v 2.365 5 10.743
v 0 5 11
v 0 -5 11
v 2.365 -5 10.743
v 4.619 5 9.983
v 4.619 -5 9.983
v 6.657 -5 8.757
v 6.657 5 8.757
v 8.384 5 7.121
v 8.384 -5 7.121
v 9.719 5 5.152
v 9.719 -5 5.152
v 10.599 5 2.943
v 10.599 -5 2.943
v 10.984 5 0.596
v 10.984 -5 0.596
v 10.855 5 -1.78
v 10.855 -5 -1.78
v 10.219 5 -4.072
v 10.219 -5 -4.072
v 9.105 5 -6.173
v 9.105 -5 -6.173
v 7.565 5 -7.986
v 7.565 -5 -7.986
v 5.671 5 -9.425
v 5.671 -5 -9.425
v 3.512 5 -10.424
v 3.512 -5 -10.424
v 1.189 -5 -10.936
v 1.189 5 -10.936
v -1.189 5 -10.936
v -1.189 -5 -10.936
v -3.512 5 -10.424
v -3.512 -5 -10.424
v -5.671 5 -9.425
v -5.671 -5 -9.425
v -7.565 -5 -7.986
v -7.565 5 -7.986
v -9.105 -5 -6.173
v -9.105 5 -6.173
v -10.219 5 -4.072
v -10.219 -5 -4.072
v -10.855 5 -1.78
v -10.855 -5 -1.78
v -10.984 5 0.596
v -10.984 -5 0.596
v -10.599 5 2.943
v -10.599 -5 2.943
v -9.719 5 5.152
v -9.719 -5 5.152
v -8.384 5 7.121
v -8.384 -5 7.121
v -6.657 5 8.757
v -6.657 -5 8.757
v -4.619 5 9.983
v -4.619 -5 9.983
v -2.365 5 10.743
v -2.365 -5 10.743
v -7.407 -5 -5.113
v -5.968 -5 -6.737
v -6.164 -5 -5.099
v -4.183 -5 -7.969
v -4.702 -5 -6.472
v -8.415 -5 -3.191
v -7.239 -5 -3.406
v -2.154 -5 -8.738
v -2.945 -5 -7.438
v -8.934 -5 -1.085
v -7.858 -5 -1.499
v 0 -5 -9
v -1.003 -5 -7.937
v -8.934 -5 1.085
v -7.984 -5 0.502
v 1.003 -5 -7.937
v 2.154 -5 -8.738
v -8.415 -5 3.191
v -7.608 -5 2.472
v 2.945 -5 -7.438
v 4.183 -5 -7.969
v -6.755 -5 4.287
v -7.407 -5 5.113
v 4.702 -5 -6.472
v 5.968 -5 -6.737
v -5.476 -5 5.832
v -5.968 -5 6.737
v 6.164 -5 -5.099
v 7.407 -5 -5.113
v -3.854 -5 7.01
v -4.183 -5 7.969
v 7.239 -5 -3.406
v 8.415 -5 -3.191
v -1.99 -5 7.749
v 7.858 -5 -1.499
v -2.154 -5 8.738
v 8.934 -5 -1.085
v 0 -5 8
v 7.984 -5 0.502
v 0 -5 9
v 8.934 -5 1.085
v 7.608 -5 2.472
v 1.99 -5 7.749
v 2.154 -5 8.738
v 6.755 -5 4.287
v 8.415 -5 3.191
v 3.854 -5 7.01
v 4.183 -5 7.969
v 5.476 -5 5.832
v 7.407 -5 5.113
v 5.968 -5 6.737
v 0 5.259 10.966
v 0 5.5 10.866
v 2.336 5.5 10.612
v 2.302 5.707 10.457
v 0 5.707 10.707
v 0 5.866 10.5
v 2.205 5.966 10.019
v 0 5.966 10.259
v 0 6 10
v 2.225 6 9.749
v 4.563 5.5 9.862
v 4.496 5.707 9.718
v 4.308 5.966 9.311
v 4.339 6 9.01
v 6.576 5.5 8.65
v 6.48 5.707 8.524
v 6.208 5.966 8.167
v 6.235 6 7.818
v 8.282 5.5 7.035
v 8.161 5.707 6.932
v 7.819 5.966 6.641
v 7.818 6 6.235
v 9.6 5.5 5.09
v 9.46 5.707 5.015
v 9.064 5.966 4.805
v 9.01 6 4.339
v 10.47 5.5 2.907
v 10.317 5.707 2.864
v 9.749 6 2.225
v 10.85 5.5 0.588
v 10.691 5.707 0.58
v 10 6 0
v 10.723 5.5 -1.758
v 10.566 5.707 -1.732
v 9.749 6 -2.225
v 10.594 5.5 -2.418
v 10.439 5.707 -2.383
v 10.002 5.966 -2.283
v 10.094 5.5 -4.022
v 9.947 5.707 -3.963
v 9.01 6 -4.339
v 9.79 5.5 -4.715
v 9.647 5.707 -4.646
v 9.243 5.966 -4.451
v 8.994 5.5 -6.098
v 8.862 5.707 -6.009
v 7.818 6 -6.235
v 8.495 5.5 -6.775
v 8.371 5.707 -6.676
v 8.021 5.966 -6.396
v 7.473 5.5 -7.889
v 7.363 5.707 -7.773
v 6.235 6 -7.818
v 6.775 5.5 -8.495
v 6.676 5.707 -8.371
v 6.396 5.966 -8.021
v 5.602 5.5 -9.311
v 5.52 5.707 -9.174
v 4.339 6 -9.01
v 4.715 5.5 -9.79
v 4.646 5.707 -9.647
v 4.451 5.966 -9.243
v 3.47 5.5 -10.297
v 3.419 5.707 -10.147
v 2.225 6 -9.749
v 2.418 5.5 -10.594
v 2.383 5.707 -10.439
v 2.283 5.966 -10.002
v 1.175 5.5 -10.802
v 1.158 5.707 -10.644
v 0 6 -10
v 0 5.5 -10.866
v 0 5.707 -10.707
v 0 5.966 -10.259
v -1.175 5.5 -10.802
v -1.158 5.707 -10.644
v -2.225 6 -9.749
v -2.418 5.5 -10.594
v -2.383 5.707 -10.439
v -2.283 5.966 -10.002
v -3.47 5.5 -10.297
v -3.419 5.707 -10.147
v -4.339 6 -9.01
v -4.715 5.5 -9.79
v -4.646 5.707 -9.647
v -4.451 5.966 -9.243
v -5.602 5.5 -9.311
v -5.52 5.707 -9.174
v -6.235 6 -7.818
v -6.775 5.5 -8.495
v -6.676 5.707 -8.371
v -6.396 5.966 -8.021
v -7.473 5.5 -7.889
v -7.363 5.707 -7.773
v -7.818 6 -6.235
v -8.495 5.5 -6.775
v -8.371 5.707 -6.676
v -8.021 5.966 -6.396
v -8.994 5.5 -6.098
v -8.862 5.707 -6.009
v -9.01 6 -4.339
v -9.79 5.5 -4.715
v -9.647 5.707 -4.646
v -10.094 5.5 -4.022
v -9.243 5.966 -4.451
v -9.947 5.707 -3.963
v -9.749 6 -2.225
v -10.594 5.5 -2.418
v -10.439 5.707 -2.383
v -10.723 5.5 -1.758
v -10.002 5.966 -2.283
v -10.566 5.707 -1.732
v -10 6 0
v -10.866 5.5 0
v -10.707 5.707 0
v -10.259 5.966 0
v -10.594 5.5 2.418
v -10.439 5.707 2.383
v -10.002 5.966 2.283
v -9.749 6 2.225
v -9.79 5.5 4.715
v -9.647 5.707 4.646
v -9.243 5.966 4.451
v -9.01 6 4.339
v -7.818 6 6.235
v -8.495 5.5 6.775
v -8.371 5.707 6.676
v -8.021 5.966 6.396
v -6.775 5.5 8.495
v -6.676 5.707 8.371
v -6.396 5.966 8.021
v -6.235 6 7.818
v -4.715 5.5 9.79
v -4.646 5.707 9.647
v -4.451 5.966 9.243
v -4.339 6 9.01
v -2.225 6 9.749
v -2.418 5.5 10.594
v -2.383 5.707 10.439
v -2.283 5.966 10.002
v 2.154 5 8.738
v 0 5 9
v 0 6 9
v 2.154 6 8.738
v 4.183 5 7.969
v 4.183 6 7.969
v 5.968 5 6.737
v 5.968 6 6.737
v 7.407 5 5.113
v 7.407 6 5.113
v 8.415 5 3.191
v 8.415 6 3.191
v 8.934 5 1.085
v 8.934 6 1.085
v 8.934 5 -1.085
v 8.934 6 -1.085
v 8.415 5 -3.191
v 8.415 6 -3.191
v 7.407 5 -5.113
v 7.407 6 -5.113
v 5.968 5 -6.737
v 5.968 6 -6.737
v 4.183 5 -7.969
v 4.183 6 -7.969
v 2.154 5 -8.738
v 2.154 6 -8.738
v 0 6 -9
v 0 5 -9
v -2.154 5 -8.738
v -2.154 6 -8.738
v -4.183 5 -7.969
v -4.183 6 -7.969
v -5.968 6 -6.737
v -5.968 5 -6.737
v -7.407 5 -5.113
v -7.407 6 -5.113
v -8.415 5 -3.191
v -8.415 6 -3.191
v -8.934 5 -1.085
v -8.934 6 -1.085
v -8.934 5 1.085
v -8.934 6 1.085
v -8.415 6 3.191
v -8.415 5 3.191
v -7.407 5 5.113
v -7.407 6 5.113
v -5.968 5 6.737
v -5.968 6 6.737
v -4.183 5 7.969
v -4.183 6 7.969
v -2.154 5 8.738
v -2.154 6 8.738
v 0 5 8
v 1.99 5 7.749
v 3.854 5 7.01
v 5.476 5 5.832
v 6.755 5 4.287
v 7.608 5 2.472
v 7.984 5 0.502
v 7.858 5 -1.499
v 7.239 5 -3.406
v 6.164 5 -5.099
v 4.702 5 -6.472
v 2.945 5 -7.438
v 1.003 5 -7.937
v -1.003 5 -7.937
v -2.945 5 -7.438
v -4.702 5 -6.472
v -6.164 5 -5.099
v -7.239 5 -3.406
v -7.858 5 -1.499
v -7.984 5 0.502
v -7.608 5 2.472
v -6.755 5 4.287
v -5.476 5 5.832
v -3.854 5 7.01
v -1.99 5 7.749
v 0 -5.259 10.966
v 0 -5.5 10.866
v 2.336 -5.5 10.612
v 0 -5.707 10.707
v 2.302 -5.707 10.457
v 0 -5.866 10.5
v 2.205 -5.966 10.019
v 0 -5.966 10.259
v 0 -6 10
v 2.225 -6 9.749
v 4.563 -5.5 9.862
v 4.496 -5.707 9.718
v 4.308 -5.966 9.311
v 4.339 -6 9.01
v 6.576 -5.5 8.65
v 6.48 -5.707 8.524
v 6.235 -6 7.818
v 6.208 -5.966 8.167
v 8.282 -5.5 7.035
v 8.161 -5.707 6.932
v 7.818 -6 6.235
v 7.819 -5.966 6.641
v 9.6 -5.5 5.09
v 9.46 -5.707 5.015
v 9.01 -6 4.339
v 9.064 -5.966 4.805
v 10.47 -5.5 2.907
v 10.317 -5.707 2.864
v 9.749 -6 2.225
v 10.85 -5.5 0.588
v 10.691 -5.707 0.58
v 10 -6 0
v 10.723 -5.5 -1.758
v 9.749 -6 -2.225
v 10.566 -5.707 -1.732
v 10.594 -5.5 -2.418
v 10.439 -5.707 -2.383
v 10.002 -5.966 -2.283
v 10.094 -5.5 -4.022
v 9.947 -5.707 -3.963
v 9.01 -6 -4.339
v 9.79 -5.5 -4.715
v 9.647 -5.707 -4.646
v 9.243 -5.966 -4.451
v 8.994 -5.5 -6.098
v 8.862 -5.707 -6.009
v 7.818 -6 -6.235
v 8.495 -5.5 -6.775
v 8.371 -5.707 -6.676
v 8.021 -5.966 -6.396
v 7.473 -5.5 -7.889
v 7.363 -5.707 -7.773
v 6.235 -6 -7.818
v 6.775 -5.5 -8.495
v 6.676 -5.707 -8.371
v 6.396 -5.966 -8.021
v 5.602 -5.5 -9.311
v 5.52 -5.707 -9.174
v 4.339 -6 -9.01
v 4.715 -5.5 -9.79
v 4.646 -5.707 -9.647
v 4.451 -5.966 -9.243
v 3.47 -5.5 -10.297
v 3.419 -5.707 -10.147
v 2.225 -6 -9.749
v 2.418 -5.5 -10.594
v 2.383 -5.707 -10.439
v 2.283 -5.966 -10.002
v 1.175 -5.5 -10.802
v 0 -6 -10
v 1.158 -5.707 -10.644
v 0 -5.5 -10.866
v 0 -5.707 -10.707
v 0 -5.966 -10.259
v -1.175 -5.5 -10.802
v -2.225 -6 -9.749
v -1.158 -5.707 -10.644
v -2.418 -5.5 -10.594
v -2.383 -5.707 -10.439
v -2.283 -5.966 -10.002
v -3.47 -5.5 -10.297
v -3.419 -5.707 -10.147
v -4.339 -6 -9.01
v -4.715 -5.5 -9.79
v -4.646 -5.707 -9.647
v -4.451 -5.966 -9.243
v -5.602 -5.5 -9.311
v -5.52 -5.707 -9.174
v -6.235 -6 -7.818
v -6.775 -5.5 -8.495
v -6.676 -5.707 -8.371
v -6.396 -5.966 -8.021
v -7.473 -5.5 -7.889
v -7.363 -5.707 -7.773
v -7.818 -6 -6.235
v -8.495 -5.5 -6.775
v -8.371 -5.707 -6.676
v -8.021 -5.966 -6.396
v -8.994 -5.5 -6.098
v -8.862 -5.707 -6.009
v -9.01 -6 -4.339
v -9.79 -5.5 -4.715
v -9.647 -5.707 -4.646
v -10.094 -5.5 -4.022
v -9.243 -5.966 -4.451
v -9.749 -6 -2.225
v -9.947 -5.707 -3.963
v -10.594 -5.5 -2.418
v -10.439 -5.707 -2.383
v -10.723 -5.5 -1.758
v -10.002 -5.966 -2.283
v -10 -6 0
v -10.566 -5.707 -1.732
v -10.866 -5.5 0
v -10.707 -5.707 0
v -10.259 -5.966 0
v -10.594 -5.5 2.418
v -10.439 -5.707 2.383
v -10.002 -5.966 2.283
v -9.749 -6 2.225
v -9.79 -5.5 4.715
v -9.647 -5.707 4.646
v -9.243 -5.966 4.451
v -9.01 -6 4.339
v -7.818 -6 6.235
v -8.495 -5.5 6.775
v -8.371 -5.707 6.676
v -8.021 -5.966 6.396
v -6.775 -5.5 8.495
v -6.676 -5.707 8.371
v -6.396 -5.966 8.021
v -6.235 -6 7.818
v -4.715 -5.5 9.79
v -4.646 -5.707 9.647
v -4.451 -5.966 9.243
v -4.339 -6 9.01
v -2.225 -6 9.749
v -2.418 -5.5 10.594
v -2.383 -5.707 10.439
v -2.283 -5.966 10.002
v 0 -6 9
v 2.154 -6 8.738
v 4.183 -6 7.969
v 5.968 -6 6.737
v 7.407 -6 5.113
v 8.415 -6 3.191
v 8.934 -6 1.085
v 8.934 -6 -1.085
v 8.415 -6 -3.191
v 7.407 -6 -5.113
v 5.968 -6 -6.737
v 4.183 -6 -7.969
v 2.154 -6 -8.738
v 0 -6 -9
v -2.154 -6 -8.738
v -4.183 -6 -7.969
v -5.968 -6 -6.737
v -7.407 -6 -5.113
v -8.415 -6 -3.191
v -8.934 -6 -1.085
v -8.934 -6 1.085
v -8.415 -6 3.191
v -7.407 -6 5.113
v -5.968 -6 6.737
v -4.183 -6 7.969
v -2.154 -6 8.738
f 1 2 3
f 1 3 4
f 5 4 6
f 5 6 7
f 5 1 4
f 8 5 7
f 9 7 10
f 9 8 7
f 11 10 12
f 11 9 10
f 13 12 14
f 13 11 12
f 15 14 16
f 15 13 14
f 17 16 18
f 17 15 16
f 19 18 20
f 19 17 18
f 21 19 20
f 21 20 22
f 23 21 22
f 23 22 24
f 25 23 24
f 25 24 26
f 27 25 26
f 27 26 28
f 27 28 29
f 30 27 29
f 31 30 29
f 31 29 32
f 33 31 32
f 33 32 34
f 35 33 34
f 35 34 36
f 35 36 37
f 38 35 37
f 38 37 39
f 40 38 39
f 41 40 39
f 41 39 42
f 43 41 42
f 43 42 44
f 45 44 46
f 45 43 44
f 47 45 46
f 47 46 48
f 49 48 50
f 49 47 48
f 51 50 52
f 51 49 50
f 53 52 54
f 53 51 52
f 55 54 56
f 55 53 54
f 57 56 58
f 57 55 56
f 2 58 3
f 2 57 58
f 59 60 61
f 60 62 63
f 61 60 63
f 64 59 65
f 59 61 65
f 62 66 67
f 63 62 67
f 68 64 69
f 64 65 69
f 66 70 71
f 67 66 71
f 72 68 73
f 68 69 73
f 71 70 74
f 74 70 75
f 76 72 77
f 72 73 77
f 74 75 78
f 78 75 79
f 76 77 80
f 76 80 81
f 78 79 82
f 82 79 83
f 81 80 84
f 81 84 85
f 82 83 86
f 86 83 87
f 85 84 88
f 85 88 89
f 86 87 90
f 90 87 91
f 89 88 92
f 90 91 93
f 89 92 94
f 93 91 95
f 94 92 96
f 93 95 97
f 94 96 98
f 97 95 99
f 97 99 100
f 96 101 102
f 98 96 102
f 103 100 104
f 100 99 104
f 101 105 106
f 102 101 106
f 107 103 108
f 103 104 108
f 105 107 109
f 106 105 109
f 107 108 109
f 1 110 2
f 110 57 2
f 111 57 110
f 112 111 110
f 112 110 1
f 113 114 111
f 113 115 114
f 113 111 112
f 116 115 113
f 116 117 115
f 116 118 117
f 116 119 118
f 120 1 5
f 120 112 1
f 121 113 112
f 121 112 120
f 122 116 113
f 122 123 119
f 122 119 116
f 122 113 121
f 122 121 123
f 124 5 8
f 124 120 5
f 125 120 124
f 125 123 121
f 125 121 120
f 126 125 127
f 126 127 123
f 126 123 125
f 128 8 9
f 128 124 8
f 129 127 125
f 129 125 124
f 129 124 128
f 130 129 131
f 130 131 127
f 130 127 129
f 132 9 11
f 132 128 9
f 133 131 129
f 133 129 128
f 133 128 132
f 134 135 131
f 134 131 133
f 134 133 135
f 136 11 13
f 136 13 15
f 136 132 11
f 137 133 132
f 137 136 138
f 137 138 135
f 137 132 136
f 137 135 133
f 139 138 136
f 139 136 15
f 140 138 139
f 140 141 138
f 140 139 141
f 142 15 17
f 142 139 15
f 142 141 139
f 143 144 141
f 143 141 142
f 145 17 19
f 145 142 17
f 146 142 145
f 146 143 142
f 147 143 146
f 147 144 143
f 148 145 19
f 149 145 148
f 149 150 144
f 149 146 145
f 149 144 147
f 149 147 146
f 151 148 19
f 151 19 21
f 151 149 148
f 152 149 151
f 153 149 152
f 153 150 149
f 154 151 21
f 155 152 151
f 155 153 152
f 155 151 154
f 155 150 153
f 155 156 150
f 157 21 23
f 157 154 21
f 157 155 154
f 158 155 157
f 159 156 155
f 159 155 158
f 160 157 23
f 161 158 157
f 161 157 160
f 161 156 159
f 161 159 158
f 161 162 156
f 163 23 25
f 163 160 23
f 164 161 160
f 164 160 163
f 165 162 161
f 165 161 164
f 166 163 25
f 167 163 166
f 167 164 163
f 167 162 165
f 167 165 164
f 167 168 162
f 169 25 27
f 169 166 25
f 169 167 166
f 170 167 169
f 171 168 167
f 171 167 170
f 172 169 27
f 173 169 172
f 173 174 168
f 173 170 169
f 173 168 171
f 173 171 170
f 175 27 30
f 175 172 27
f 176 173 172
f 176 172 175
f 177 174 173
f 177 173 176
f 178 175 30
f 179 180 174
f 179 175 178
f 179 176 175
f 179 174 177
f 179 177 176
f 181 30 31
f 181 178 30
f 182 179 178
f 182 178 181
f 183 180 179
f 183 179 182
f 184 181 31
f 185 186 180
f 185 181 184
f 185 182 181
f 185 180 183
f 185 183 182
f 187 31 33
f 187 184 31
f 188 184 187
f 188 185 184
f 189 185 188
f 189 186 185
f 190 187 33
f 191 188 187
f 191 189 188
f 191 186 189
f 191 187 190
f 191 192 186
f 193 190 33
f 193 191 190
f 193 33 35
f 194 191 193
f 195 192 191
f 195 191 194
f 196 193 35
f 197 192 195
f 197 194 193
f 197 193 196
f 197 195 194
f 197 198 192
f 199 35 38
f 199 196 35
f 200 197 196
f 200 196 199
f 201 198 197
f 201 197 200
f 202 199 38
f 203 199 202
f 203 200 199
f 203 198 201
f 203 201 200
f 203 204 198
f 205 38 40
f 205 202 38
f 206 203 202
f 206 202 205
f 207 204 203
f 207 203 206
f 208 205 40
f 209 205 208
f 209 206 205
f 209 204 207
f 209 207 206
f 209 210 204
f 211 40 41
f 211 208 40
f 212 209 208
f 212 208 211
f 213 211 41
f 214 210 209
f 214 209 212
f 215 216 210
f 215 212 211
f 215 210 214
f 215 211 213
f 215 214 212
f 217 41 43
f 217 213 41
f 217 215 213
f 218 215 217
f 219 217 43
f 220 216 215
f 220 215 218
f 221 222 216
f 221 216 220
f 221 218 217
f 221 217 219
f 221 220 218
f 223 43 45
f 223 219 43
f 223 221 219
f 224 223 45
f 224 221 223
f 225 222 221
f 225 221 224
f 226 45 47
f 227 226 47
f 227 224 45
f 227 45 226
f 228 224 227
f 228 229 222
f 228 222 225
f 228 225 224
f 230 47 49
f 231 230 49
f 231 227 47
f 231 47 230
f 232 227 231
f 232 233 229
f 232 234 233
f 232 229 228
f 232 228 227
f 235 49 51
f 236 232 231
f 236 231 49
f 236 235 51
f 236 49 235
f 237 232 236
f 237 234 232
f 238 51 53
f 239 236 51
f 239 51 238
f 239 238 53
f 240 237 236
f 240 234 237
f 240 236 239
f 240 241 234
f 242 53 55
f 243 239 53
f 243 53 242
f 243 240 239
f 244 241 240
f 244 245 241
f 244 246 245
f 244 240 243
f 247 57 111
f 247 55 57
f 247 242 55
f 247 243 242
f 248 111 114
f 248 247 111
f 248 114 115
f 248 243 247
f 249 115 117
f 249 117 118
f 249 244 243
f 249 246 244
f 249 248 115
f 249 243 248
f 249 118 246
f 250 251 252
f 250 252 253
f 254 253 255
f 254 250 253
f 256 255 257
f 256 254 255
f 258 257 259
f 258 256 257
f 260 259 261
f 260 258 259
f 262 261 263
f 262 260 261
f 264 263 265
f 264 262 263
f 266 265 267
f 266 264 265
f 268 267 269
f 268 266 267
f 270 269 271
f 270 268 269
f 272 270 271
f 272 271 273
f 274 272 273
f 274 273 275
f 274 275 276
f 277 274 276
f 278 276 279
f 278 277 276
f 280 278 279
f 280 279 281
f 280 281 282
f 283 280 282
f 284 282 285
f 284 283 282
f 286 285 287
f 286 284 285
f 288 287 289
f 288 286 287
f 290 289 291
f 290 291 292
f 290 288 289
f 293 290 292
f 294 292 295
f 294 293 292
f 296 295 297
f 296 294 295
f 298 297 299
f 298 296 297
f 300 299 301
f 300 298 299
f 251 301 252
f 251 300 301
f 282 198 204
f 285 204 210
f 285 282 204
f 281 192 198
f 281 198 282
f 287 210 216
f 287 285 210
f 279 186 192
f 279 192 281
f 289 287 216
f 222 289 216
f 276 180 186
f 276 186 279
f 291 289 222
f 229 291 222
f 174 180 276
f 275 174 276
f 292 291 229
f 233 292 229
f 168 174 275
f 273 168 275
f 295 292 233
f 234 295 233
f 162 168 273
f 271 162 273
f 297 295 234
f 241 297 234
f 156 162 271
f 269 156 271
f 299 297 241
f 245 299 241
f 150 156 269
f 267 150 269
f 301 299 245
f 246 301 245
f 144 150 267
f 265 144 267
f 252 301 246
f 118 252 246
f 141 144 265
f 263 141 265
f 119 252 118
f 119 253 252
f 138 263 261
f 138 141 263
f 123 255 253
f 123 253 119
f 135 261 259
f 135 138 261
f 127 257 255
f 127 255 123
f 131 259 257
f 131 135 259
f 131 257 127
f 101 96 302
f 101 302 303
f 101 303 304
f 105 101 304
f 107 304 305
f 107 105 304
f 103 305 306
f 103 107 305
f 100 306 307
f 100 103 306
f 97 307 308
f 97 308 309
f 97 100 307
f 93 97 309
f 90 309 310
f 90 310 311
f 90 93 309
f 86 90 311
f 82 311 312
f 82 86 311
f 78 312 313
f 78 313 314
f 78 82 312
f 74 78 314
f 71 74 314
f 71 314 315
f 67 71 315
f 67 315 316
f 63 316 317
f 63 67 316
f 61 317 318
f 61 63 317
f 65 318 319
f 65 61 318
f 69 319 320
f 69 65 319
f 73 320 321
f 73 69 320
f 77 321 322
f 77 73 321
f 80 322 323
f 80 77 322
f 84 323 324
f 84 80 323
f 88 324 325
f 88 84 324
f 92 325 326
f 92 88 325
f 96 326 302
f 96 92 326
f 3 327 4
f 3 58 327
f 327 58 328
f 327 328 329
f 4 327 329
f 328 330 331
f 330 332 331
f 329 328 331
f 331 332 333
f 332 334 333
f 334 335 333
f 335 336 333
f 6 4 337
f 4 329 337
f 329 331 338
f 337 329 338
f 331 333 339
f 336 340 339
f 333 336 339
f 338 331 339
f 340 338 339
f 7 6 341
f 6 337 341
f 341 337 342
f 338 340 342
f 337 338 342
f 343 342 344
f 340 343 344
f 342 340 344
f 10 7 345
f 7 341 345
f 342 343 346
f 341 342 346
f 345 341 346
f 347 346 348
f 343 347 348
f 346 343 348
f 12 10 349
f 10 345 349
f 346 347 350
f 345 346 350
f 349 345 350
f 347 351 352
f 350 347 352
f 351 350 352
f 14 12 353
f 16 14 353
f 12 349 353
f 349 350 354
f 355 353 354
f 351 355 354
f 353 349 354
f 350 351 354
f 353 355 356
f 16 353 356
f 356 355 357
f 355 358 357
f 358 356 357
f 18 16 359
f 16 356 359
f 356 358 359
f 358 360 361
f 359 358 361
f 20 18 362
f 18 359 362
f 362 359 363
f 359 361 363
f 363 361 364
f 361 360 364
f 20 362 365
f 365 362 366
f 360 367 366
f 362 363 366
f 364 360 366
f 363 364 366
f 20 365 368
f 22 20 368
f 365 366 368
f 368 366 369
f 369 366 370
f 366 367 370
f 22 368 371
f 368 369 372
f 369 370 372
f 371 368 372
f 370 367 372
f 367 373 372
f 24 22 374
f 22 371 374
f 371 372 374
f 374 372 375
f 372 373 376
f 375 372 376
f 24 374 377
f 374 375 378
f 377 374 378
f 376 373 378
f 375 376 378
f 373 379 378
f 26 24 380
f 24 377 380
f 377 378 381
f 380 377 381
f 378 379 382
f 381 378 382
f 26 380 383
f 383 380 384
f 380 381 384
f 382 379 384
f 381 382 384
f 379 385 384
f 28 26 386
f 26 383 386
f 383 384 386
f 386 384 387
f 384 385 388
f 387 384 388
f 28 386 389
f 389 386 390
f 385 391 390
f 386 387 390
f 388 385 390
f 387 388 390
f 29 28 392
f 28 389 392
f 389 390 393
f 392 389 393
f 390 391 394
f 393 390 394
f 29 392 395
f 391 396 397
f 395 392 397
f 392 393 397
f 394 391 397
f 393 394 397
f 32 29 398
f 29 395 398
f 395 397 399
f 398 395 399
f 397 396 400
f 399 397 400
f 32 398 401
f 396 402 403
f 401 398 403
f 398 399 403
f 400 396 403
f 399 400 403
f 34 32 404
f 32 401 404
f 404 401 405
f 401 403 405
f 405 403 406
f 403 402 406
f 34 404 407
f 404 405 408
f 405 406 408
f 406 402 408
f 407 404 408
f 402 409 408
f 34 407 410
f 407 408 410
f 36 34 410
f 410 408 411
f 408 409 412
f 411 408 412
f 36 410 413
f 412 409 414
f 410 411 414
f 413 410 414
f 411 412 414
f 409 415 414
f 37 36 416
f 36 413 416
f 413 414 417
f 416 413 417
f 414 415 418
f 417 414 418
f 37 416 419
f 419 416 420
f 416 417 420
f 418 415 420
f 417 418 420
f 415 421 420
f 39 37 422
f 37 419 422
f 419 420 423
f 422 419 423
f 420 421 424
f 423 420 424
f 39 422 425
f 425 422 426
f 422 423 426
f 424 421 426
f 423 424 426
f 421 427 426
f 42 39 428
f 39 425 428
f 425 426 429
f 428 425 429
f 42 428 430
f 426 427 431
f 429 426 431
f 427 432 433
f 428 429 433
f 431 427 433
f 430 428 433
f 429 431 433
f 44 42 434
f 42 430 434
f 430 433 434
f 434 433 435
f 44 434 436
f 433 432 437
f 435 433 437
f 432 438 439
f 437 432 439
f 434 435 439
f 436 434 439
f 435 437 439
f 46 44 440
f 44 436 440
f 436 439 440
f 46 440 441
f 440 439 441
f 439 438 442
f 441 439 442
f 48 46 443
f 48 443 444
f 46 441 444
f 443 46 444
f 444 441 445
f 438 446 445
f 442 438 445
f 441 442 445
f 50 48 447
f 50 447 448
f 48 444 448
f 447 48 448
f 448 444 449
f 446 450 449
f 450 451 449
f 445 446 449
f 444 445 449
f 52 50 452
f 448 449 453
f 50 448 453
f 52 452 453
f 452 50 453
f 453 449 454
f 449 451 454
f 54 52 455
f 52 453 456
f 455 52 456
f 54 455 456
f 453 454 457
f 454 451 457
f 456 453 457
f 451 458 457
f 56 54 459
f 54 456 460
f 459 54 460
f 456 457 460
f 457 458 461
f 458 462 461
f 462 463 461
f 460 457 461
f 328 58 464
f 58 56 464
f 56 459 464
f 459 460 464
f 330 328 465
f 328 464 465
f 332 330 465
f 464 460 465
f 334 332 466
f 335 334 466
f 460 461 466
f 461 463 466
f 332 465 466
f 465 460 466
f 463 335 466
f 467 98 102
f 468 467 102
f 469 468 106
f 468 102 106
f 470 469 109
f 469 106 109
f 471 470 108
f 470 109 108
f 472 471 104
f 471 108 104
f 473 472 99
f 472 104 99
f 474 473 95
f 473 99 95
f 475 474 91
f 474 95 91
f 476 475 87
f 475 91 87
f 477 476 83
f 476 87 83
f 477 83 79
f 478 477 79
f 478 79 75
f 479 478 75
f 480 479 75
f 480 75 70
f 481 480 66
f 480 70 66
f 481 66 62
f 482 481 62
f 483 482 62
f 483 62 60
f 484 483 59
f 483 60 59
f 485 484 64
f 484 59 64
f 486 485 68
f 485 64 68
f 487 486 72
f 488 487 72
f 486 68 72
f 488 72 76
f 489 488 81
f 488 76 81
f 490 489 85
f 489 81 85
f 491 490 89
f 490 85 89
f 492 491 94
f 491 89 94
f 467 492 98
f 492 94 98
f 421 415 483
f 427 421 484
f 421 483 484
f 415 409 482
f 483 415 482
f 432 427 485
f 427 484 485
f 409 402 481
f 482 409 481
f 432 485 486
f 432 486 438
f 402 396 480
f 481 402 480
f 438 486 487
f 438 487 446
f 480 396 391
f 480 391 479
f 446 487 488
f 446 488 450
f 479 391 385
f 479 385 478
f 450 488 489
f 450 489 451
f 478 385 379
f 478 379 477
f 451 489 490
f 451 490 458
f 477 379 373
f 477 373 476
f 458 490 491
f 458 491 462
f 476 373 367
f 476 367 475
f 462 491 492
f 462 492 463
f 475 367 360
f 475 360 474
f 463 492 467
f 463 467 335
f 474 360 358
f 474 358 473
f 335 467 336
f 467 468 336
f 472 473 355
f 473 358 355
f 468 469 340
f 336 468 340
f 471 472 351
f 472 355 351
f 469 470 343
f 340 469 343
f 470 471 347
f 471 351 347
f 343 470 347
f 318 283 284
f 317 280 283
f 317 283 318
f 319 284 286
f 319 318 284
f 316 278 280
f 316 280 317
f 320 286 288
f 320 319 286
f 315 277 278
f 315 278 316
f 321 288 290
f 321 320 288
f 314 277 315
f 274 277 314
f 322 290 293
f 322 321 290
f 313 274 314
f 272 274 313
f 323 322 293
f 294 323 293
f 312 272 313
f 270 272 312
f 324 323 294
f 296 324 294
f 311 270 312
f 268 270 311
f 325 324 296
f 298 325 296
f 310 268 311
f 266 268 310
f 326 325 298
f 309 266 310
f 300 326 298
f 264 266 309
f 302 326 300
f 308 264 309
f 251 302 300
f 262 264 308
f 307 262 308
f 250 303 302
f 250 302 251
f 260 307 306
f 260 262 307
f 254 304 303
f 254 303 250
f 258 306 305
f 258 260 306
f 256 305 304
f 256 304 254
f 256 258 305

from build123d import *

# Parameters (mm, degrees)
SKETCH1_R           = 11
SKETCH1_R_2         = 8
BOSS_EXTRUDE1_DEPTH = 6
FILLET1_R           = 1
CUT_EXTRUDE1_START  = -1
SKETCH2_R           = 9
SKETCH2_R_2         = 8
CUT_EXTRUDE1_DEPTH  = 1


with BuildPart() as part:
    # Sketch1 → Boss-Extrude1 (new, symmetric)
    with BuildSketch(Plane(origin=(0, 0, 0), x_dir=(1, 0, 0), z_dir=(0, 1, 0))):
        with Locations(Location((0, 0, 0), (0, 0, 270))):
            Circle(SKETCH1_R)
        with Locations(Location((0, 0, 0), (0, 0, 270))):
            Circle(SKETCH1_R_2, mode=Mode.SUBTRACT)
    extrude(amount=BOSS_EXTRUDE1_DEPTH, both=True)

    # Fillet1
    fillet1_edges = [part.edges().sort_by_distance(p)[0] for p in [
        (0, -6, -11),
        (0, 6, -11),
    ]]
    fillet(fillet1_edges, radius=FILLET1_R)

    # Sketch2 → Cut-Extrude1 (cut)
    with BuildSketch(Plane(origin=(0, 6, 0), x_dir=(1, 0, 0), z_dir=(0, 1, 0)).offset(CUT_EXTRUDE1_START)):
        with Locations(Location((0, 0, 0), (0, 0, 270))):
            Circle(SKETCH2_R)
        with Locations(Location((0, 0, 0), (0, 0, 270))):
            Circle(SKETCH2_R_2, mode=Mode.SUBTRACT)
    cut_extrude1 = extrude(amount=CUT_EXTRUDE1_DEPTH, mode=Mode.SUBTRACT)

    # Mirror1: Cut-Extrude1 across plane
    add(cut_extrude1.mirror(Plane.ZX), mode=Mode.SUBTRACT)


solid = part.part
